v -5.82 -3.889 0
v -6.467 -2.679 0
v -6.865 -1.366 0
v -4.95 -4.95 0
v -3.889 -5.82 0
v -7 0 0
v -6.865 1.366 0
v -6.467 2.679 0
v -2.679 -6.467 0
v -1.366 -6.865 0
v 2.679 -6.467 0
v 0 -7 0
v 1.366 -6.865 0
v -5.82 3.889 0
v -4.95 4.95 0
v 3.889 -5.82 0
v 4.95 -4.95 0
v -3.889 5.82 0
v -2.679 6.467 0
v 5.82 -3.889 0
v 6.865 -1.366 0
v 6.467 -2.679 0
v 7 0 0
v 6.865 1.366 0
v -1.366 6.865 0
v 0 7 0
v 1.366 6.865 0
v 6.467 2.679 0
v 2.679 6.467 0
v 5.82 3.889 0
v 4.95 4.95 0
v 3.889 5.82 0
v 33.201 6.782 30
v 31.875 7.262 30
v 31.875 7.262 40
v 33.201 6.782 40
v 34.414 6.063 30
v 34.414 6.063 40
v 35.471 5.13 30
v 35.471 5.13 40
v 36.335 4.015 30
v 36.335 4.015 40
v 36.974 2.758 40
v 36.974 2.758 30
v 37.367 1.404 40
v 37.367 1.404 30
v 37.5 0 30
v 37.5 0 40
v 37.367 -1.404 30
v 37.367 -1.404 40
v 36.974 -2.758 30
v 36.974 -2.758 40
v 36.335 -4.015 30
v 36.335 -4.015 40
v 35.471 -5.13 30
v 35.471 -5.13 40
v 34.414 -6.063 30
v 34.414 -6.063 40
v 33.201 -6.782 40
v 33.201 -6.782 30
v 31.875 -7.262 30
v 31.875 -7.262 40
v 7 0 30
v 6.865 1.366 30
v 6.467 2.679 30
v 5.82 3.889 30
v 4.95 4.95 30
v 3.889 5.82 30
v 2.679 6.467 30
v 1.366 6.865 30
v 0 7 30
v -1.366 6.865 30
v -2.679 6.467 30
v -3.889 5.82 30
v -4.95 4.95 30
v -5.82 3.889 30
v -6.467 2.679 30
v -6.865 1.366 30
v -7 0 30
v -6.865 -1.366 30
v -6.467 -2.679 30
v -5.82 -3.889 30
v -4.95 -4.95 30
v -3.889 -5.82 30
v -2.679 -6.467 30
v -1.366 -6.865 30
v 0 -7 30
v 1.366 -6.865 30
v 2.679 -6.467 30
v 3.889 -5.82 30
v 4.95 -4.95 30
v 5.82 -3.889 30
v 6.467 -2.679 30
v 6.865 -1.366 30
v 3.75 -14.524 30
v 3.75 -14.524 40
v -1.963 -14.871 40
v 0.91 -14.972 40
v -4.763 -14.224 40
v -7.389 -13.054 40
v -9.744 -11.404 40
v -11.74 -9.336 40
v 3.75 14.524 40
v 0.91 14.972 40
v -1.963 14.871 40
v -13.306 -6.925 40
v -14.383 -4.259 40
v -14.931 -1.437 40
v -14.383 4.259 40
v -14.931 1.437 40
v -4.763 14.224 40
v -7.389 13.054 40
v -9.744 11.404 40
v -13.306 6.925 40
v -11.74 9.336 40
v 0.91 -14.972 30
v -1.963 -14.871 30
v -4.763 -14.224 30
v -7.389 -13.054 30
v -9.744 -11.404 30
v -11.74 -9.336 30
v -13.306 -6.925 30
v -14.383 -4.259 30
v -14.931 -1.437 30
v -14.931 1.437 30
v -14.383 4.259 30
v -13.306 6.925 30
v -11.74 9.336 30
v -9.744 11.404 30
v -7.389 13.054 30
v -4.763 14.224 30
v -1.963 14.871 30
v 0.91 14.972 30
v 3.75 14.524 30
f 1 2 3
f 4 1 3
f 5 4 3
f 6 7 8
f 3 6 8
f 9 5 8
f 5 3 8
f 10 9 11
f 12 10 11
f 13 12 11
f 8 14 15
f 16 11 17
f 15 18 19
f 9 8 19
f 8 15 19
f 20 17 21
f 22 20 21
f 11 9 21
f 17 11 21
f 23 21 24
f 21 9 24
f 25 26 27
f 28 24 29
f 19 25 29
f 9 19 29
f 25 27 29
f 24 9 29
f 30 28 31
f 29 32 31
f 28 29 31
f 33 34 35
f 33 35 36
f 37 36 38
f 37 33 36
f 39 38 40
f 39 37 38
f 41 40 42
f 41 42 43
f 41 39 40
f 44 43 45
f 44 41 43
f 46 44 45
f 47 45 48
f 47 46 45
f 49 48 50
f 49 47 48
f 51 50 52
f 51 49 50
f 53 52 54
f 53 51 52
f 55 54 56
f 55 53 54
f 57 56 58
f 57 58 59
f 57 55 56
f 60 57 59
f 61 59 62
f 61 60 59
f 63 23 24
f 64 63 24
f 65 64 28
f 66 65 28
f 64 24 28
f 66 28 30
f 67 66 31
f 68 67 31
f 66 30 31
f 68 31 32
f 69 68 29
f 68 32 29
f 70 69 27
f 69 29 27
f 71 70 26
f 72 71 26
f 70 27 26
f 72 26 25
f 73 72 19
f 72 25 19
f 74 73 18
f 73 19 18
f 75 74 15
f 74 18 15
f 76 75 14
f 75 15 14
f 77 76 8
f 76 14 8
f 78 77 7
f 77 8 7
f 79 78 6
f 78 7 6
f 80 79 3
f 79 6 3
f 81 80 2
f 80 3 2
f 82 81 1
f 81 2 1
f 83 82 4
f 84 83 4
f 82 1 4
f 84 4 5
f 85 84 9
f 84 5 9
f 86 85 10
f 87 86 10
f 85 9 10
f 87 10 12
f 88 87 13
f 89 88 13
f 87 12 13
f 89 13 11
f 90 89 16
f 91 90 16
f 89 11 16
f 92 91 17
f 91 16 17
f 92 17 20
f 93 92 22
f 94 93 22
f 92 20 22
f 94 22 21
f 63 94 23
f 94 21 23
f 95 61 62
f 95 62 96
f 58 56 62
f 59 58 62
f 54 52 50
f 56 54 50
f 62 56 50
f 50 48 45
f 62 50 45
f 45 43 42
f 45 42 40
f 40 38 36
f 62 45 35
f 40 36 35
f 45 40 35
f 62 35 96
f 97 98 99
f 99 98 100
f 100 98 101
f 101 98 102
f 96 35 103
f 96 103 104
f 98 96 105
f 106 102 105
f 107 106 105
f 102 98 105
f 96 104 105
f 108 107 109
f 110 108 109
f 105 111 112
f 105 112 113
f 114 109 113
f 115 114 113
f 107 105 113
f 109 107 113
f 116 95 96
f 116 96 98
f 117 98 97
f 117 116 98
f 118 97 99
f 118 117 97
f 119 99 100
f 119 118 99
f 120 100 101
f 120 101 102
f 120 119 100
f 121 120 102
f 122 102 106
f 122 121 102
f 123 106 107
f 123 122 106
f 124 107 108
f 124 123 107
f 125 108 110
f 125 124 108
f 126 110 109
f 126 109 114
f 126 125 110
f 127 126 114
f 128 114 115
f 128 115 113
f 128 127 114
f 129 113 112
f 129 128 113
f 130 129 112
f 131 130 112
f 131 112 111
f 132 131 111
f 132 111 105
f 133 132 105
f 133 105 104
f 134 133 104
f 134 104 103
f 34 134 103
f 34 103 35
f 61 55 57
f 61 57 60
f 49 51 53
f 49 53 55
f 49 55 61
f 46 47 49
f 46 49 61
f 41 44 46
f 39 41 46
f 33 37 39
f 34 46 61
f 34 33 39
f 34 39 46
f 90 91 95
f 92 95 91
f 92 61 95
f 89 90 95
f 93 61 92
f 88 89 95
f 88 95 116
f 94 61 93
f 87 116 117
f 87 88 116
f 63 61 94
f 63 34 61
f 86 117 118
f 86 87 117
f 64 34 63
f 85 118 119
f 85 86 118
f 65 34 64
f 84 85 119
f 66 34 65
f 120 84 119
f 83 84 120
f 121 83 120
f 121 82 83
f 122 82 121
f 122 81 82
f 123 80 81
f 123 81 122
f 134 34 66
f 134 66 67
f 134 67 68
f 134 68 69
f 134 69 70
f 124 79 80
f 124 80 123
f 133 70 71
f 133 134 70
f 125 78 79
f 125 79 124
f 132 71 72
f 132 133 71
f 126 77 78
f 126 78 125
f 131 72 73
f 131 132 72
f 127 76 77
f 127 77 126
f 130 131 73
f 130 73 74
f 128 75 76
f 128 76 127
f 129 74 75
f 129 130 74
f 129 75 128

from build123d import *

# Parameters (mm, degrees)
SKETCH1_R           = 7
BOSS_EXTRUDE1_DEPTH = 30
BOSS_EXTRUDE2_DEPTH = 10


with BuildPart() as part:
    # Sketch1 → Boss-Extrude1 (new body)
    with BuildSketch(Plane.XY):
        Circle(SKETCH1_R)
    extrude(amount=BOSS_EXTRUDE1_DEPTH)

    # Sketch2 → Boss-Extrude2 (add)
    with BuildSketch(Plane.XY.offset(30)):
        with BuildLine():
            Line((3.75, 14.523687548), (31.875, 7.261843774))
            ThreePointArc((31.875, 7.261843774), (37.5, 0), (31.875, -7.261843774))
            Line((31.875, -7.261843774), (3.75, -14.523687548))
            ThreePointArc((3.75, -14.523687548), (-15, 0), (3.75, 14.523687548))
        make_face()
    extrude(amount=BOSS_EXTRUDE2_DEPTH)


solid = part.part
